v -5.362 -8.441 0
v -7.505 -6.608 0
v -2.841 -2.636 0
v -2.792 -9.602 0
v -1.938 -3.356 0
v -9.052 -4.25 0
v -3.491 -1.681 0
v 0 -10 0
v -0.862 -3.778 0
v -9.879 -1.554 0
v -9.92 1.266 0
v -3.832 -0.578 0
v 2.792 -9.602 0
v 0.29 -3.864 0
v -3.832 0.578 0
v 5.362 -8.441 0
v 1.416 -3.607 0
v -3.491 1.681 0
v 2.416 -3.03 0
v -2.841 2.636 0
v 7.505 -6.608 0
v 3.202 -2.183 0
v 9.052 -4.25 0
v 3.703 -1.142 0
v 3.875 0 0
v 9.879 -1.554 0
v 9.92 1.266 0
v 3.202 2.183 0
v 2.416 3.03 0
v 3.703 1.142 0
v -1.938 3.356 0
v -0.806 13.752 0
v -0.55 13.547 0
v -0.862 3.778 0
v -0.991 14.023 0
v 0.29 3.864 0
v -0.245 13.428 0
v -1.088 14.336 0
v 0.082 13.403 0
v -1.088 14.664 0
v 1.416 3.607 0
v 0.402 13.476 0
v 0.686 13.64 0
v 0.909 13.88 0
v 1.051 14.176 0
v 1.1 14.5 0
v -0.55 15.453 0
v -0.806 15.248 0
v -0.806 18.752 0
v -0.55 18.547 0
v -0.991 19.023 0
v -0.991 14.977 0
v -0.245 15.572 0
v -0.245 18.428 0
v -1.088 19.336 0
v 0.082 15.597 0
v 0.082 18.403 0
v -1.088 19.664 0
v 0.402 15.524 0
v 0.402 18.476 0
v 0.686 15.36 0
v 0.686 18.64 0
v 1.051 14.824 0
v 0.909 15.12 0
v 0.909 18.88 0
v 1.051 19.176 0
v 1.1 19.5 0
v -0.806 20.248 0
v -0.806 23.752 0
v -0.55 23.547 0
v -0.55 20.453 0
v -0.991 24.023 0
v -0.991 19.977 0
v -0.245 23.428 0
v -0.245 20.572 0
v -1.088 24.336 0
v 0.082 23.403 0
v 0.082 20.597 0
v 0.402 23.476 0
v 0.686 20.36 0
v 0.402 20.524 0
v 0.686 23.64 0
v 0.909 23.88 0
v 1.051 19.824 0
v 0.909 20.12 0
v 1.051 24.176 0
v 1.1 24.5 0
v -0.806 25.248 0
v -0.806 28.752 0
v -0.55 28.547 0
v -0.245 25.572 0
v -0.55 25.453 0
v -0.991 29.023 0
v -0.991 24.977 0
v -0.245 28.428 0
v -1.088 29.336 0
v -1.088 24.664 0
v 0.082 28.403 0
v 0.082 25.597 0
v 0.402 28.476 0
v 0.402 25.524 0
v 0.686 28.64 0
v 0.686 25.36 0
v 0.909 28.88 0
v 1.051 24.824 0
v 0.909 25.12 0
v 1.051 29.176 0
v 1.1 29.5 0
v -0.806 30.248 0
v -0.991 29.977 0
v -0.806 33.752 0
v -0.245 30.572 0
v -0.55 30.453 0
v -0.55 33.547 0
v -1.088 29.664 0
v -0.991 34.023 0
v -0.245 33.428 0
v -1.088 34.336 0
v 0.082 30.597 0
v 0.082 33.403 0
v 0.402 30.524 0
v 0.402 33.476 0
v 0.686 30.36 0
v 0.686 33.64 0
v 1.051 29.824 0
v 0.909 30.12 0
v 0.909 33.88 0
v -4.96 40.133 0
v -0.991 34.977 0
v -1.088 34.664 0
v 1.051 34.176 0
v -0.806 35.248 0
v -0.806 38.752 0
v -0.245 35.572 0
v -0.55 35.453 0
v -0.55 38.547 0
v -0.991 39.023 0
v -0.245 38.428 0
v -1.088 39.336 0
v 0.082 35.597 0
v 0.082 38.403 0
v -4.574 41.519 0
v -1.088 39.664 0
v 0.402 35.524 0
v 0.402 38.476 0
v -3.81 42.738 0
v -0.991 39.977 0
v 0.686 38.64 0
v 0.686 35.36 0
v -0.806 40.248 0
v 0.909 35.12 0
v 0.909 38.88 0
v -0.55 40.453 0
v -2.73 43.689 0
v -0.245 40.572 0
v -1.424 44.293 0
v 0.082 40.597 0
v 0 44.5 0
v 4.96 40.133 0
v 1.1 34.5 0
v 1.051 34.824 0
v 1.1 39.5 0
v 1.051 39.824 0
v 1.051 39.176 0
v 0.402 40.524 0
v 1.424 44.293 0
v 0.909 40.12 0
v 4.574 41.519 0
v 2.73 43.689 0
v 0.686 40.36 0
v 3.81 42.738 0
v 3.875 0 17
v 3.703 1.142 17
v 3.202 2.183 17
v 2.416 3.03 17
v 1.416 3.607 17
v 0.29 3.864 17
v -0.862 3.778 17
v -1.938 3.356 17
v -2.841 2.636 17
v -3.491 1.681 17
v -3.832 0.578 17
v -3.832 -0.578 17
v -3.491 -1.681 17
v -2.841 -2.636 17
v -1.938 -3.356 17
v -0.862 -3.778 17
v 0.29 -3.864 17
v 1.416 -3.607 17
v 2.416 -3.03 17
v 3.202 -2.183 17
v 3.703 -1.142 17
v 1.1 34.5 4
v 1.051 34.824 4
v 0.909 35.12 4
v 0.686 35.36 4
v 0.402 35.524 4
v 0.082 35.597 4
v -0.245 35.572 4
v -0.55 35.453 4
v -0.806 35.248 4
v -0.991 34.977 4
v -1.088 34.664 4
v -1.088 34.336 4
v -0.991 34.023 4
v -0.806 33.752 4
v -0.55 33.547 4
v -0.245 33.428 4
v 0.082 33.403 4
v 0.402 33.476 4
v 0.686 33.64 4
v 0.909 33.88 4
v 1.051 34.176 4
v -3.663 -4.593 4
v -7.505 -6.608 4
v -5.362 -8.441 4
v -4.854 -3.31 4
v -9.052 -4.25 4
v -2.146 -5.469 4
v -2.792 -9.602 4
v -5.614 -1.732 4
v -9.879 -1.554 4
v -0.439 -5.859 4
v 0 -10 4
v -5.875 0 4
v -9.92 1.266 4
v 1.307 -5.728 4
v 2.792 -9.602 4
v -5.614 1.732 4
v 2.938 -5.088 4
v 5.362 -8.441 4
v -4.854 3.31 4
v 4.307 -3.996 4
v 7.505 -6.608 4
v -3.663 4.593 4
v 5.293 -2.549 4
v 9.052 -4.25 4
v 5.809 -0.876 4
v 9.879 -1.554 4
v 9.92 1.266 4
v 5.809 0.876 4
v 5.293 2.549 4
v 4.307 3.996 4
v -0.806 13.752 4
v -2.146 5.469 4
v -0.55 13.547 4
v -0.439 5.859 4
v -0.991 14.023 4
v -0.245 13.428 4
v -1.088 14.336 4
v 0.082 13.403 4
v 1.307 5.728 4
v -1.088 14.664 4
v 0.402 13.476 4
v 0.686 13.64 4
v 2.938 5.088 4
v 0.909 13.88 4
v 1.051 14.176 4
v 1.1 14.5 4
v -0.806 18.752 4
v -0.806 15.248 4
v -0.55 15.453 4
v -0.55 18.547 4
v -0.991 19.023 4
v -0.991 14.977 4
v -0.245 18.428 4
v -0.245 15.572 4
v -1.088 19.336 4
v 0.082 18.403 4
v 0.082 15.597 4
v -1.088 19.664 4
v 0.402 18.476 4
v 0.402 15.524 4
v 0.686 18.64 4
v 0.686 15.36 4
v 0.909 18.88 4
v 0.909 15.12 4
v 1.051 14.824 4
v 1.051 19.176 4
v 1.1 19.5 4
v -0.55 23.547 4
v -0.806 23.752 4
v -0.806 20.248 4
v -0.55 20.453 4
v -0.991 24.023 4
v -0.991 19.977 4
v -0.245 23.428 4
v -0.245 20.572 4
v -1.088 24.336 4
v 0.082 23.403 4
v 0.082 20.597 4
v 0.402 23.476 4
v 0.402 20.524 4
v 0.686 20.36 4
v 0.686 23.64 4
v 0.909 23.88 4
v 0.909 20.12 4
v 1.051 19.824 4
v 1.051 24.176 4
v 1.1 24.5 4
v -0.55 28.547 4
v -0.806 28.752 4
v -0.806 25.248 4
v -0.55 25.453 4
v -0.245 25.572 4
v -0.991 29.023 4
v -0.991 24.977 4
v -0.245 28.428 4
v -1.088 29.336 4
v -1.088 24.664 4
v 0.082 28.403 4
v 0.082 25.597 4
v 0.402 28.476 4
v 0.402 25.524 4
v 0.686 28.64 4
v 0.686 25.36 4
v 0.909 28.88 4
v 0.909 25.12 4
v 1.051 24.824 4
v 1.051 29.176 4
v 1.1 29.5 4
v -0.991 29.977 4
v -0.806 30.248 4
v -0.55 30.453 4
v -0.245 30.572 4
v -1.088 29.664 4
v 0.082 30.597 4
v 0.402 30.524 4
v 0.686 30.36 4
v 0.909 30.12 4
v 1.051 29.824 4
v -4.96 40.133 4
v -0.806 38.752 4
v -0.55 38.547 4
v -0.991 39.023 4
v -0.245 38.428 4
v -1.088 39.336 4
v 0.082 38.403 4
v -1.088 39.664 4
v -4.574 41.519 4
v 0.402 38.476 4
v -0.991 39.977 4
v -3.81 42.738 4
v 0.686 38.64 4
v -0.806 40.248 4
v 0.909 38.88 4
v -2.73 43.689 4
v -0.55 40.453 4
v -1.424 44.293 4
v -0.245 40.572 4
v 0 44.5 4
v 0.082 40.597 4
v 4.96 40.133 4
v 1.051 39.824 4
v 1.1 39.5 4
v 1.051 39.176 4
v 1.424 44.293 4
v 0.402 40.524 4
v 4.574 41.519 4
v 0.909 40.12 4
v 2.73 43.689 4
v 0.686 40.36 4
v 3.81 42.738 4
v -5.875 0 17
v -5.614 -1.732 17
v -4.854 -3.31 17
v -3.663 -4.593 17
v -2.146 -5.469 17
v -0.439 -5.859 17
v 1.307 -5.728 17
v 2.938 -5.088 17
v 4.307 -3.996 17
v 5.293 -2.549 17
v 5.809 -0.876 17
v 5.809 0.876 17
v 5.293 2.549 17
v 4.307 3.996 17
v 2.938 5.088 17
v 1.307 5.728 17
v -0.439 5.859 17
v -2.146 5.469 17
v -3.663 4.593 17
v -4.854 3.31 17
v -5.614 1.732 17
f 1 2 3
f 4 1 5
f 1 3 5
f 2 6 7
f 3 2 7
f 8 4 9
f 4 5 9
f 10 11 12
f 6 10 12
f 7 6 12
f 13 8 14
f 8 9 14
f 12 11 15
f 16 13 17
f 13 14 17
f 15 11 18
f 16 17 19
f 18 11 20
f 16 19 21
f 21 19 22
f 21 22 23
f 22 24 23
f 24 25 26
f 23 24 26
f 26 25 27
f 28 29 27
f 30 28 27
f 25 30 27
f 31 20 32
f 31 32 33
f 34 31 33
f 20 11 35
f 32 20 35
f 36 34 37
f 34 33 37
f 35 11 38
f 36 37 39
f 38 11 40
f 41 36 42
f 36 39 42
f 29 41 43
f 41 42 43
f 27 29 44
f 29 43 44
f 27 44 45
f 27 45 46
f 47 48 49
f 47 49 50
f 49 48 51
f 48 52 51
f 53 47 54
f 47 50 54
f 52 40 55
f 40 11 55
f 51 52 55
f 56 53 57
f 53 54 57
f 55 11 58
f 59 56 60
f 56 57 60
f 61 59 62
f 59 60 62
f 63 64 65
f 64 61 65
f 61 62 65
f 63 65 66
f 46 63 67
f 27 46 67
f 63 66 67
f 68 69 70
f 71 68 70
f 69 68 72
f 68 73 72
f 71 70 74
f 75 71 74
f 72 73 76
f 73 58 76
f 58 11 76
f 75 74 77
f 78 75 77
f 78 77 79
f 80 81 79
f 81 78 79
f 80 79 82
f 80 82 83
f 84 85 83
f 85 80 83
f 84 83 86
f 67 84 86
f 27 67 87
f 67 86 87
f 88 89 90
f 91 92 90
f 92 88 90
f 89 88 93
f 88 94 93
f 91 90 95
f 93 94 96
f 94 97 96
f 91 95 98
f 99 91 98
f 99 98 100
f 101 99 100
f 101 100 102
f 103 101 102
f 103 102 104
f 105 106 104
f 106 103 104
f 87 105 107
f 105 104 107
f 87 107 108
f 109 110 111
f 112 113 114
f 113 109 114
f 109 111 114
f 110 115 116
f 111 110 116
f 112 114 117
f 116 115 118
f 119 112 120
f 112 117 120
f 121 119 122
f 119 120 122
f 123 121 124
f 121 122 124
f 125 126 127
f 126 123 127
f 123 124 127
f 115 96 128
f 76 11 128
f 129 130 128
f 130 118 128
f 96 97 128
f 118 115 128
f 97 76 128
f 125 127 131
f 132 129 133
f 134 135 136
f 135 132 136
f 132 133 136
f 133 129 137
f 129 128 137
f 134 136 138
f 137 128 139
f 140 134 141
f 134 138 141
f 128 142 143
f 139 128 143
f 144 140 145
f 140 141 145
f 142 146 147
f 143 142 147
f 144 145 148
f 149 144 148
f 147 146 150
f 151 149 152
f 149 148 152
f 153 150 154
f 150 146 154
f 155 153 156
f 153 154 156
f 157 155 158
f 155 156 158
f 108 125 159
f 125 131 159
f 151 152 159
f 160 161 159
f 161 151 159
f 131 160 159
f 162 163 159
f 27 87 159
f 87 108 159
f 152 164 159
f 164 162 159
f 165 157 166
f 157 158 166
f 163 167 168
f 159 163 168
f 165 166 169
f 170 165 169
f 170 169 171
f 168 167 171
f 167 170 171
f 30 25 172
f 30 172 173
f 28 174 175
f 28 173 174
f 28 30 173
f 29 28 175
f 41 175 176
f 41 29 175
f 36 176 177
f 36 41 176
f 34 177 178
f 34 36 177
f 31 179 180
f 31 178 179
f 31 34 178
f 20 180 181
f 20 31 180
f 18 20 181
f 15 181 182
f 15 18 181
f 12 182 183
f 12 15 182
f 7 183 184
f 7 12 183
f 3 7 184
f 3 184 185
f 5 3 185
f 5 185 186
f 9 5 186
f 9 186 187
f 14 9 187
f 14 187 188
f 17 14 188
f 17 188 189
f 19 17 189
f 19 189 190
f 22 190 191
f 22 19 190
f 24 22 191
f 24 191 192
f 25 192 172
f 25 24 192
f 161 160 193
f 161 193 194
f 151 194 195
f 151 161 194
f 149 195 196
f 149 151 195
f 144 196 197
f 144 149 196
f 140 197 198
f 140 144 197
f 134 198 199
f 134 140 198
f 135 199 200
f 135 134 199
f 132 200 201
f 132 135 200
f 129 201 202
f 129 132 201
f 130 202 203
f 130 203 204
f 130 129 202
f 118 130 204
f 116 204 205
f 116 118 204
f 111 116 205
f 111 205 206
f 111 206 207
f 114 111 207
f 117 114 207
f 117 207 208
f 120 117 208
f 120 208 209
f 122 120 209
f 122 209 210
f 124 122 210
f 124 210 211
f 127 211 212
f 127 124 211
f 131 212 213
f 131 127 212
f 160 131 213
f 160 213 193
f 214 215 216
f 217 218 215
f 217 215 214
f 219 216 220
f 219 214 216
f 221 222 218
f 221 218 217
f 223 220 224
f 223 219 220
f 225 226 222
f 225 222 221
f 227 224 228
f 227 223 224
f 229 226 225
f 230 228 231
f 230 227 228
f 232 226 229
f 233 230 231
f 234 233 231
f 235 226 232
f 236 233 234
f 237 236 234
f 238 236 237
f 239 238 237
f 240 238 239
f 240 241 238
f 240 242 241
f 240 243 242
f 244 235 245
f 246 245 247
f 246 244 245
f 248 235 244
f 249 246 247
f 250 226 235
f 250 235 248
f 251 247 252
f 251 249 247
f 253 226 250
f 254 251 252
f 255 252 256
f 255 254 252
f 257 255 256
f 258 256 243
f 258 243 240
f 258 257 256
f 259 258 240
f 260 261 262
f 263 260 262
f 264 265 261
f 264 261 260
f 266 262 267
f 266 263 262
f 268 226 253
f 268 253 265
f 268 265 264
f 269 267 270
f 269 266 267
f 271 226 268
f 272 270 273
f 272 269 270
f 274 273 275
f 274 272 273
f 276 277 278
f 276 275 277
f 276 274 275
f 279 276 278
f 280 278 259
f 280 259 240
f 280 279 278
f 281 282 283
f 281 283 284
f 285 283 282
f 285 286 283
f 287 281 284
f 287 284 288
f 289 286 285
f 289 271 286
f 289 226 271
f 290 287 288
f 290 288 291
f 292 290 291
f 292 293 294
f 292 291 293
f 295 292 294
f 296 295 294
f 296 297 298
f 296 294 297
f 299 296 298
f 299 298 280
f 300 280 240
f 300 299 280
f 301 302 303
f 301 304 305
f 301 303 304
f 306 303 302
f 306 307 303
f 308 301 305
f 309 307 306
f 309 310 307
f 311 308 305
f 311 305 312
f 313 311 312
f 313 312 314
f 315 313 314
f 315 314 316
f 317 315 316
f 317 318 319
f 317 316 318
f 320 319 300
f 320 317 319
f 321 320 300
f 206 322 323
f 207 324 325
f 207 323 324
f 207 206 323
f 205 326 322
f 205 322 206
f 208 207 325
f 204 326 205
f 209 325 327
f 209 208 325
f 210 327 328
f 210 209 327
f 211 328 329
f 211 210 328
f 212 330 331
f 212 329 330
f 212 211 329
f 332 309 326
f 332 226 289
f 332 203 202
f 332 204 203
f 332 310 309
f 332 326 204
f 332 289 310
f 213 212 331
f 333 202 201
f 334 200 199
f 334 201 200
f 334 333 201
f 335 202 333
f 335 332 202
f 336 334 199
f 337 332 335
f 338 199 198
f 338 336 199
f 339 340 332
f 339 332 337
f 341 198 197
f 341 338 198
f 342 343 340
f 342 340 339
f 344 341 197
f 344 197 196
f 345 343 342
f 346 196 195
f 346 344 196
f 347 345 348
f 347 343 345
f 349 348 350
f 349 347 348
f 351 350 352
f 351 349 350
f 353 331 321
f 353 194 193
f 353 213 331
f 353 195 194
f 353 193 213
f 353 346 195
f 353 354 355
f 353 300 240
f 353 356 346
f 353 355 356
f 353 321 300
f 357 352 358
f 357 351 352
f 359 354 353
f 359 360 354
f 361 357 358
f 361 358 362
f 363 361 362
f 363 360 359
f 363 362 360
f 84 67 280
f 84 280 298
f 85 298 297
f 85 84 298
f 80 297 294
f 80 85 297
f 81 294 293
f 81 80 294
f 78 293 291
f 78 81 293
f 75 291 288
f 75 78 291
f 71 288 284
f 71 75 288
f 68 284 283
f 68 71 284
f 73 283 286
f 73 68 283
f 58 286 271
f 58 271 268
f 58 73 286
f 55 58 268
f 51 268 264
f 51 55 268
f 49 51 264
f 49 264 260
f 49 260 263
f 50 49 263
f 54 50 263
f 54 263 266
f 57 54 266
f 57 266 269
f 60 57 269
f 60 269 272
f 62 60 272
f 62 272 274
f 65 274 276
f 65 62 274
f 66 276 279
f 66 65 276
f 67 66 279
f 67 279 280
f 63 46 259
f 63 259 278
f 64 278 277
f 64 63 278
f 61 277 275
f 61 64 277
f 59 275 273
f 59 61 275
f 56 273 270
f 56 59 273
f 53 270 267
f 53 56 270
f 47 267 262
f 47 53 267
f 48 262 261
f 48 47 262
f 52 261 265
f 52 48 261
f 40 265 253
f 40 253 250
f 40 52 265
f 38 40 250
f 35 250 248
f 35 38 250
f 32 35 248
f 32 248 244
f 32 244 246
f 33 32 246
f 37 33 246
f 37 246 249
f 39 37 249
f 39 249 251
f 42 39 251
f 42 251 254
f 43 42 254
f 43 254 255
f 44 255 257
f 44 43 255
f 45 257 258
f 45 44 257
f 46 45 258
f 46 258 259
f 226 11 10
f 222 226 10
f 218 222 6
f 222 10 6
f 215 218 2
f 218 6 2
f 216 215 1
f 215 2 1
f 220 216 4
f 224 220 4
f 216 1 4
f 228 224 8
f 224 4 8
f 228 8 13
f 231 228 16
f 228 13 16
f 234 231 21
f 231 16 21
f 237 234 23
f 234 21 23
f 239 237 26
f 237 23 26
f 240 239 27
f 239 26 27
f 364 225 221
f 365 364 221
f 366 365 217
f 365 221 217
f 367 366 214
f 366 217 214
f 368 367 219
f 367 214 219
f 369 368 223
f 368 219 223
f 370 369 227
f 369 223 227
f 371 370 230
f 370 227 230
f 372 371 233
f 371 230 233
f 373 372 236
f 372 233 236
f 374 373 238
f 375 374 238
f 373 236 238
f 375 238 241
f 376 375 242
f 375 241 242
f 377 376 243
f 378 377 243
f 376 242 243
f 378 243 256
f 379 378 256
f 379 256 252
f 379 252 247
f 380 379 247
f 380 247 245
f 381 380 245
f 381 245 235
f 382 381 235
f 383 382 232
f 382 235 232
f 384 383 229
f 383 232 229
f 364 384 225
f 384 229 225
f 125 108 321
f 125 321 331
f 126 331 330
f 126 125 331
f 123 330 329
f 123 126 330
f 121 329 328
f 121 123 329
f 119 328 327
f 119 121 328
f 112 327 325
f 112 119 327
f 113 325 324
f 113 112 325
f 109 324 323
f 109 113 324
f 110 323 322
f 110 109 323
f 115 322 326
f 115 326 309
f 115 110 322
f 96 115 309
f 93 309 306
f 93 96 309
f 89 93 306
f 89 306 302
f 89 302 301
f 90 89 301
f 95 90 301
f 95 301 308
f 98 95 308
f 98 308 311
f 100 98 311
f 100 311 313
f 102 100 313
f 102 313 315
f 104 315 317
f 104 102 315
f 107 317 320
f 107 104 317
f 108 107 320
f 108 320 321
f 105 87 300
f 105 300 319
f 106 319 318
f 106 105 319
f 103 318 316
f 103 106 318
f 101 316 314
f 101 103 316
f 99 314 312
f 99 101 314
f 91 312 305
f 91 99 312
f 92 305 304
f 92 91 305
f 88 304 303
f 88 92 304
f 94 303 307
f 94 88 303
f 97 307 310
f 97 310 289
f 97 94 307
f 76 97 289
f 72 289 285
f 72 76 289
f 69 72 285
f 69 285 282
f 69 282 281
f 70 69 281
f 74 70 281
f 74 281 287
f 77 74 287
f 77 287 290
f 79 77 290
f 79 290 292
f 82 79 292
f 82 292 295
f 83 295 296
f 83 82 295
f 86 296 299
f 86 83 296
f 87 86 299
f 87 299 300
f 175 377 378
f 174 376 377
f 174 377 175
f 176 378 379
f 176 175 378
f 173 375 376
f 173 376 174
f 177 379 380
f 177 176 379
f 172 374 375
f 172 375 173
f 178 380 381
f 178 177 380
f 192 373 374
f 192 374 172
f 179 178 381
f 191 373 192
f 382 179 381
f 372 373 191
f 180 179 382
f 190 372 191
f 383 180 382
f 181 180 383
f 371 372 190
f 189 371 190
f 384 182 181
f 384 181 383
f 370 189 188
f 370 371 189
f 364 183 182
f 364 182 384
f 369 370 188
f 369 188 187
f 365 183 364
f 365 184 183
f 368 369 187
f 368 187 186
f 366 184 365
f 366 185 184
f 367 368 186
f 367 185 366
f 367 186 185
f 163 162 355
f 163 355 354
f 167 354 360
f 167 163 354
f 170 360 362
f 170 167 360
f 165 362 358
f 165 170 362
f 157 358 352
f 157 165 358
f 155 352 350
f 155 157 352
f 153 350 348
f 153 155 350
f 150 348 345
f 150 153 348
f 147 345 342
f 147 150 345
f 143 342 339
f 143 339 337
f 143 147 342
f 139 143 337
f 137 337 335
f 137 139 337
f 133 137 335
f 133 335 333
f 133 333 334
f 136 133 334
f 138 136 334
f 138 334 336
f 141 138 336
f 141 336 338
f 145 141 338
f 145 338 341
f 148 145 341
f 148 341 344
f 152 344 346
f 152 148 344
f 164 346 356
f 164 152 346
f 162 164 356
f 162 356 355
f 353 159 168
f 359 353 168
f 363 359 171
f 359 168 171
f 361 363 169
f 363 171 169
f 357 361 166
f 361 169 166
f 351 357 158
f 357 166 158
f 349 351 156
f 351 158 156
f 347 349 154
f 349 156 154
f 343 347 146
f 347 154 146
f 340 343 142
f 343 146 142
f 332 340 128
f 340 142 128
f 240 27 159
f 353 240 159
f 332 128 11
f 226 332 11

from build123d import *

# Parameters (mm, degrees)
SKETCH1_R               = 1.1
BOSS_EXTRUDE1_DEPTH     = 4
SKETCH2_R               = 5.875
BOSS_EXTRUDE2_DEPTH     = 13
CUT_EXTRUDE1_DEPTH      = 49.674942219
CUT_EXTRUDE1_DEPTH_BACK = 49.674942219
SKETCH3_R               = 3.875


with BuildPart() as part:
    # Sketch1 → Boss-Extrude1 (new body)
    with BuildSketch(Plane.XY):
        with BuildLine():
            Line((-4.959780557, 40.132911392), (-9.919561113, 1.265822785))
            ThreePointArc((-9.919561113, 1.265822785), (0, -10), (9.919561113, 1.265822785))
            Line((9.919561113, 1.265822785), (4.959780557, 40.132911392))
            ThreePointArc((4.959780557, 40.132911392), (0, 44.5), (-4.959780557, 40.132911392))
        make_face()
        with Locations((0, 39.5)):
            Circle(SKETCH1_R, mode=Mode.SUBTRACT)
        with Locations((0, 34.5)):
            Circle(SKETCH1_R, mode=Mode.SUBTRACT)
        with Locations((0, 29.5)):
            Circle(SKETCH1_R, mode=Mode.SUBTRACT)
        with Locations((0, 24.5)):
            Circle(SKETCH1_R, mode=Mode.SUBTRACT)
        with Locations((0, 19.5)):
            Circle(SKETCH1_R, mode=Mode.SUBTRACT)
        with Locations((0, 14.5)):
            Circle(SKETCH1_R, mode=Mode.SUBTRACT)
    extrude(amount=BOSS_EXTRUDE1_DEPTH)

    # Sketch2 → Boss-Extrude2 (add)
    with BuildSketch(Plane.XY.offset(4)):
        with Locations(Location((0, 0, 0), (0, 0, 180))):
            Circle(SKETCH2_R)
    extrude(amount=BOSS_EXTRUDE2_DEPTH)

    # Sketch3 → Cut-Extrude1 (cut, two sides: drawn at the far end of the back side and taken through both)
    with BuildSketch(Plane.XY.offset(-CUT_EXTRUDE1_DEPTH_BACK)):
        Circle(SKETCH3_R)
    extrude(amount=CUT_EXTRUDE1_DEPTH + CUT_EXTRUDE1_DEPTH_BACK, mode=Mode.SUBTRACT)


solid = part.part
